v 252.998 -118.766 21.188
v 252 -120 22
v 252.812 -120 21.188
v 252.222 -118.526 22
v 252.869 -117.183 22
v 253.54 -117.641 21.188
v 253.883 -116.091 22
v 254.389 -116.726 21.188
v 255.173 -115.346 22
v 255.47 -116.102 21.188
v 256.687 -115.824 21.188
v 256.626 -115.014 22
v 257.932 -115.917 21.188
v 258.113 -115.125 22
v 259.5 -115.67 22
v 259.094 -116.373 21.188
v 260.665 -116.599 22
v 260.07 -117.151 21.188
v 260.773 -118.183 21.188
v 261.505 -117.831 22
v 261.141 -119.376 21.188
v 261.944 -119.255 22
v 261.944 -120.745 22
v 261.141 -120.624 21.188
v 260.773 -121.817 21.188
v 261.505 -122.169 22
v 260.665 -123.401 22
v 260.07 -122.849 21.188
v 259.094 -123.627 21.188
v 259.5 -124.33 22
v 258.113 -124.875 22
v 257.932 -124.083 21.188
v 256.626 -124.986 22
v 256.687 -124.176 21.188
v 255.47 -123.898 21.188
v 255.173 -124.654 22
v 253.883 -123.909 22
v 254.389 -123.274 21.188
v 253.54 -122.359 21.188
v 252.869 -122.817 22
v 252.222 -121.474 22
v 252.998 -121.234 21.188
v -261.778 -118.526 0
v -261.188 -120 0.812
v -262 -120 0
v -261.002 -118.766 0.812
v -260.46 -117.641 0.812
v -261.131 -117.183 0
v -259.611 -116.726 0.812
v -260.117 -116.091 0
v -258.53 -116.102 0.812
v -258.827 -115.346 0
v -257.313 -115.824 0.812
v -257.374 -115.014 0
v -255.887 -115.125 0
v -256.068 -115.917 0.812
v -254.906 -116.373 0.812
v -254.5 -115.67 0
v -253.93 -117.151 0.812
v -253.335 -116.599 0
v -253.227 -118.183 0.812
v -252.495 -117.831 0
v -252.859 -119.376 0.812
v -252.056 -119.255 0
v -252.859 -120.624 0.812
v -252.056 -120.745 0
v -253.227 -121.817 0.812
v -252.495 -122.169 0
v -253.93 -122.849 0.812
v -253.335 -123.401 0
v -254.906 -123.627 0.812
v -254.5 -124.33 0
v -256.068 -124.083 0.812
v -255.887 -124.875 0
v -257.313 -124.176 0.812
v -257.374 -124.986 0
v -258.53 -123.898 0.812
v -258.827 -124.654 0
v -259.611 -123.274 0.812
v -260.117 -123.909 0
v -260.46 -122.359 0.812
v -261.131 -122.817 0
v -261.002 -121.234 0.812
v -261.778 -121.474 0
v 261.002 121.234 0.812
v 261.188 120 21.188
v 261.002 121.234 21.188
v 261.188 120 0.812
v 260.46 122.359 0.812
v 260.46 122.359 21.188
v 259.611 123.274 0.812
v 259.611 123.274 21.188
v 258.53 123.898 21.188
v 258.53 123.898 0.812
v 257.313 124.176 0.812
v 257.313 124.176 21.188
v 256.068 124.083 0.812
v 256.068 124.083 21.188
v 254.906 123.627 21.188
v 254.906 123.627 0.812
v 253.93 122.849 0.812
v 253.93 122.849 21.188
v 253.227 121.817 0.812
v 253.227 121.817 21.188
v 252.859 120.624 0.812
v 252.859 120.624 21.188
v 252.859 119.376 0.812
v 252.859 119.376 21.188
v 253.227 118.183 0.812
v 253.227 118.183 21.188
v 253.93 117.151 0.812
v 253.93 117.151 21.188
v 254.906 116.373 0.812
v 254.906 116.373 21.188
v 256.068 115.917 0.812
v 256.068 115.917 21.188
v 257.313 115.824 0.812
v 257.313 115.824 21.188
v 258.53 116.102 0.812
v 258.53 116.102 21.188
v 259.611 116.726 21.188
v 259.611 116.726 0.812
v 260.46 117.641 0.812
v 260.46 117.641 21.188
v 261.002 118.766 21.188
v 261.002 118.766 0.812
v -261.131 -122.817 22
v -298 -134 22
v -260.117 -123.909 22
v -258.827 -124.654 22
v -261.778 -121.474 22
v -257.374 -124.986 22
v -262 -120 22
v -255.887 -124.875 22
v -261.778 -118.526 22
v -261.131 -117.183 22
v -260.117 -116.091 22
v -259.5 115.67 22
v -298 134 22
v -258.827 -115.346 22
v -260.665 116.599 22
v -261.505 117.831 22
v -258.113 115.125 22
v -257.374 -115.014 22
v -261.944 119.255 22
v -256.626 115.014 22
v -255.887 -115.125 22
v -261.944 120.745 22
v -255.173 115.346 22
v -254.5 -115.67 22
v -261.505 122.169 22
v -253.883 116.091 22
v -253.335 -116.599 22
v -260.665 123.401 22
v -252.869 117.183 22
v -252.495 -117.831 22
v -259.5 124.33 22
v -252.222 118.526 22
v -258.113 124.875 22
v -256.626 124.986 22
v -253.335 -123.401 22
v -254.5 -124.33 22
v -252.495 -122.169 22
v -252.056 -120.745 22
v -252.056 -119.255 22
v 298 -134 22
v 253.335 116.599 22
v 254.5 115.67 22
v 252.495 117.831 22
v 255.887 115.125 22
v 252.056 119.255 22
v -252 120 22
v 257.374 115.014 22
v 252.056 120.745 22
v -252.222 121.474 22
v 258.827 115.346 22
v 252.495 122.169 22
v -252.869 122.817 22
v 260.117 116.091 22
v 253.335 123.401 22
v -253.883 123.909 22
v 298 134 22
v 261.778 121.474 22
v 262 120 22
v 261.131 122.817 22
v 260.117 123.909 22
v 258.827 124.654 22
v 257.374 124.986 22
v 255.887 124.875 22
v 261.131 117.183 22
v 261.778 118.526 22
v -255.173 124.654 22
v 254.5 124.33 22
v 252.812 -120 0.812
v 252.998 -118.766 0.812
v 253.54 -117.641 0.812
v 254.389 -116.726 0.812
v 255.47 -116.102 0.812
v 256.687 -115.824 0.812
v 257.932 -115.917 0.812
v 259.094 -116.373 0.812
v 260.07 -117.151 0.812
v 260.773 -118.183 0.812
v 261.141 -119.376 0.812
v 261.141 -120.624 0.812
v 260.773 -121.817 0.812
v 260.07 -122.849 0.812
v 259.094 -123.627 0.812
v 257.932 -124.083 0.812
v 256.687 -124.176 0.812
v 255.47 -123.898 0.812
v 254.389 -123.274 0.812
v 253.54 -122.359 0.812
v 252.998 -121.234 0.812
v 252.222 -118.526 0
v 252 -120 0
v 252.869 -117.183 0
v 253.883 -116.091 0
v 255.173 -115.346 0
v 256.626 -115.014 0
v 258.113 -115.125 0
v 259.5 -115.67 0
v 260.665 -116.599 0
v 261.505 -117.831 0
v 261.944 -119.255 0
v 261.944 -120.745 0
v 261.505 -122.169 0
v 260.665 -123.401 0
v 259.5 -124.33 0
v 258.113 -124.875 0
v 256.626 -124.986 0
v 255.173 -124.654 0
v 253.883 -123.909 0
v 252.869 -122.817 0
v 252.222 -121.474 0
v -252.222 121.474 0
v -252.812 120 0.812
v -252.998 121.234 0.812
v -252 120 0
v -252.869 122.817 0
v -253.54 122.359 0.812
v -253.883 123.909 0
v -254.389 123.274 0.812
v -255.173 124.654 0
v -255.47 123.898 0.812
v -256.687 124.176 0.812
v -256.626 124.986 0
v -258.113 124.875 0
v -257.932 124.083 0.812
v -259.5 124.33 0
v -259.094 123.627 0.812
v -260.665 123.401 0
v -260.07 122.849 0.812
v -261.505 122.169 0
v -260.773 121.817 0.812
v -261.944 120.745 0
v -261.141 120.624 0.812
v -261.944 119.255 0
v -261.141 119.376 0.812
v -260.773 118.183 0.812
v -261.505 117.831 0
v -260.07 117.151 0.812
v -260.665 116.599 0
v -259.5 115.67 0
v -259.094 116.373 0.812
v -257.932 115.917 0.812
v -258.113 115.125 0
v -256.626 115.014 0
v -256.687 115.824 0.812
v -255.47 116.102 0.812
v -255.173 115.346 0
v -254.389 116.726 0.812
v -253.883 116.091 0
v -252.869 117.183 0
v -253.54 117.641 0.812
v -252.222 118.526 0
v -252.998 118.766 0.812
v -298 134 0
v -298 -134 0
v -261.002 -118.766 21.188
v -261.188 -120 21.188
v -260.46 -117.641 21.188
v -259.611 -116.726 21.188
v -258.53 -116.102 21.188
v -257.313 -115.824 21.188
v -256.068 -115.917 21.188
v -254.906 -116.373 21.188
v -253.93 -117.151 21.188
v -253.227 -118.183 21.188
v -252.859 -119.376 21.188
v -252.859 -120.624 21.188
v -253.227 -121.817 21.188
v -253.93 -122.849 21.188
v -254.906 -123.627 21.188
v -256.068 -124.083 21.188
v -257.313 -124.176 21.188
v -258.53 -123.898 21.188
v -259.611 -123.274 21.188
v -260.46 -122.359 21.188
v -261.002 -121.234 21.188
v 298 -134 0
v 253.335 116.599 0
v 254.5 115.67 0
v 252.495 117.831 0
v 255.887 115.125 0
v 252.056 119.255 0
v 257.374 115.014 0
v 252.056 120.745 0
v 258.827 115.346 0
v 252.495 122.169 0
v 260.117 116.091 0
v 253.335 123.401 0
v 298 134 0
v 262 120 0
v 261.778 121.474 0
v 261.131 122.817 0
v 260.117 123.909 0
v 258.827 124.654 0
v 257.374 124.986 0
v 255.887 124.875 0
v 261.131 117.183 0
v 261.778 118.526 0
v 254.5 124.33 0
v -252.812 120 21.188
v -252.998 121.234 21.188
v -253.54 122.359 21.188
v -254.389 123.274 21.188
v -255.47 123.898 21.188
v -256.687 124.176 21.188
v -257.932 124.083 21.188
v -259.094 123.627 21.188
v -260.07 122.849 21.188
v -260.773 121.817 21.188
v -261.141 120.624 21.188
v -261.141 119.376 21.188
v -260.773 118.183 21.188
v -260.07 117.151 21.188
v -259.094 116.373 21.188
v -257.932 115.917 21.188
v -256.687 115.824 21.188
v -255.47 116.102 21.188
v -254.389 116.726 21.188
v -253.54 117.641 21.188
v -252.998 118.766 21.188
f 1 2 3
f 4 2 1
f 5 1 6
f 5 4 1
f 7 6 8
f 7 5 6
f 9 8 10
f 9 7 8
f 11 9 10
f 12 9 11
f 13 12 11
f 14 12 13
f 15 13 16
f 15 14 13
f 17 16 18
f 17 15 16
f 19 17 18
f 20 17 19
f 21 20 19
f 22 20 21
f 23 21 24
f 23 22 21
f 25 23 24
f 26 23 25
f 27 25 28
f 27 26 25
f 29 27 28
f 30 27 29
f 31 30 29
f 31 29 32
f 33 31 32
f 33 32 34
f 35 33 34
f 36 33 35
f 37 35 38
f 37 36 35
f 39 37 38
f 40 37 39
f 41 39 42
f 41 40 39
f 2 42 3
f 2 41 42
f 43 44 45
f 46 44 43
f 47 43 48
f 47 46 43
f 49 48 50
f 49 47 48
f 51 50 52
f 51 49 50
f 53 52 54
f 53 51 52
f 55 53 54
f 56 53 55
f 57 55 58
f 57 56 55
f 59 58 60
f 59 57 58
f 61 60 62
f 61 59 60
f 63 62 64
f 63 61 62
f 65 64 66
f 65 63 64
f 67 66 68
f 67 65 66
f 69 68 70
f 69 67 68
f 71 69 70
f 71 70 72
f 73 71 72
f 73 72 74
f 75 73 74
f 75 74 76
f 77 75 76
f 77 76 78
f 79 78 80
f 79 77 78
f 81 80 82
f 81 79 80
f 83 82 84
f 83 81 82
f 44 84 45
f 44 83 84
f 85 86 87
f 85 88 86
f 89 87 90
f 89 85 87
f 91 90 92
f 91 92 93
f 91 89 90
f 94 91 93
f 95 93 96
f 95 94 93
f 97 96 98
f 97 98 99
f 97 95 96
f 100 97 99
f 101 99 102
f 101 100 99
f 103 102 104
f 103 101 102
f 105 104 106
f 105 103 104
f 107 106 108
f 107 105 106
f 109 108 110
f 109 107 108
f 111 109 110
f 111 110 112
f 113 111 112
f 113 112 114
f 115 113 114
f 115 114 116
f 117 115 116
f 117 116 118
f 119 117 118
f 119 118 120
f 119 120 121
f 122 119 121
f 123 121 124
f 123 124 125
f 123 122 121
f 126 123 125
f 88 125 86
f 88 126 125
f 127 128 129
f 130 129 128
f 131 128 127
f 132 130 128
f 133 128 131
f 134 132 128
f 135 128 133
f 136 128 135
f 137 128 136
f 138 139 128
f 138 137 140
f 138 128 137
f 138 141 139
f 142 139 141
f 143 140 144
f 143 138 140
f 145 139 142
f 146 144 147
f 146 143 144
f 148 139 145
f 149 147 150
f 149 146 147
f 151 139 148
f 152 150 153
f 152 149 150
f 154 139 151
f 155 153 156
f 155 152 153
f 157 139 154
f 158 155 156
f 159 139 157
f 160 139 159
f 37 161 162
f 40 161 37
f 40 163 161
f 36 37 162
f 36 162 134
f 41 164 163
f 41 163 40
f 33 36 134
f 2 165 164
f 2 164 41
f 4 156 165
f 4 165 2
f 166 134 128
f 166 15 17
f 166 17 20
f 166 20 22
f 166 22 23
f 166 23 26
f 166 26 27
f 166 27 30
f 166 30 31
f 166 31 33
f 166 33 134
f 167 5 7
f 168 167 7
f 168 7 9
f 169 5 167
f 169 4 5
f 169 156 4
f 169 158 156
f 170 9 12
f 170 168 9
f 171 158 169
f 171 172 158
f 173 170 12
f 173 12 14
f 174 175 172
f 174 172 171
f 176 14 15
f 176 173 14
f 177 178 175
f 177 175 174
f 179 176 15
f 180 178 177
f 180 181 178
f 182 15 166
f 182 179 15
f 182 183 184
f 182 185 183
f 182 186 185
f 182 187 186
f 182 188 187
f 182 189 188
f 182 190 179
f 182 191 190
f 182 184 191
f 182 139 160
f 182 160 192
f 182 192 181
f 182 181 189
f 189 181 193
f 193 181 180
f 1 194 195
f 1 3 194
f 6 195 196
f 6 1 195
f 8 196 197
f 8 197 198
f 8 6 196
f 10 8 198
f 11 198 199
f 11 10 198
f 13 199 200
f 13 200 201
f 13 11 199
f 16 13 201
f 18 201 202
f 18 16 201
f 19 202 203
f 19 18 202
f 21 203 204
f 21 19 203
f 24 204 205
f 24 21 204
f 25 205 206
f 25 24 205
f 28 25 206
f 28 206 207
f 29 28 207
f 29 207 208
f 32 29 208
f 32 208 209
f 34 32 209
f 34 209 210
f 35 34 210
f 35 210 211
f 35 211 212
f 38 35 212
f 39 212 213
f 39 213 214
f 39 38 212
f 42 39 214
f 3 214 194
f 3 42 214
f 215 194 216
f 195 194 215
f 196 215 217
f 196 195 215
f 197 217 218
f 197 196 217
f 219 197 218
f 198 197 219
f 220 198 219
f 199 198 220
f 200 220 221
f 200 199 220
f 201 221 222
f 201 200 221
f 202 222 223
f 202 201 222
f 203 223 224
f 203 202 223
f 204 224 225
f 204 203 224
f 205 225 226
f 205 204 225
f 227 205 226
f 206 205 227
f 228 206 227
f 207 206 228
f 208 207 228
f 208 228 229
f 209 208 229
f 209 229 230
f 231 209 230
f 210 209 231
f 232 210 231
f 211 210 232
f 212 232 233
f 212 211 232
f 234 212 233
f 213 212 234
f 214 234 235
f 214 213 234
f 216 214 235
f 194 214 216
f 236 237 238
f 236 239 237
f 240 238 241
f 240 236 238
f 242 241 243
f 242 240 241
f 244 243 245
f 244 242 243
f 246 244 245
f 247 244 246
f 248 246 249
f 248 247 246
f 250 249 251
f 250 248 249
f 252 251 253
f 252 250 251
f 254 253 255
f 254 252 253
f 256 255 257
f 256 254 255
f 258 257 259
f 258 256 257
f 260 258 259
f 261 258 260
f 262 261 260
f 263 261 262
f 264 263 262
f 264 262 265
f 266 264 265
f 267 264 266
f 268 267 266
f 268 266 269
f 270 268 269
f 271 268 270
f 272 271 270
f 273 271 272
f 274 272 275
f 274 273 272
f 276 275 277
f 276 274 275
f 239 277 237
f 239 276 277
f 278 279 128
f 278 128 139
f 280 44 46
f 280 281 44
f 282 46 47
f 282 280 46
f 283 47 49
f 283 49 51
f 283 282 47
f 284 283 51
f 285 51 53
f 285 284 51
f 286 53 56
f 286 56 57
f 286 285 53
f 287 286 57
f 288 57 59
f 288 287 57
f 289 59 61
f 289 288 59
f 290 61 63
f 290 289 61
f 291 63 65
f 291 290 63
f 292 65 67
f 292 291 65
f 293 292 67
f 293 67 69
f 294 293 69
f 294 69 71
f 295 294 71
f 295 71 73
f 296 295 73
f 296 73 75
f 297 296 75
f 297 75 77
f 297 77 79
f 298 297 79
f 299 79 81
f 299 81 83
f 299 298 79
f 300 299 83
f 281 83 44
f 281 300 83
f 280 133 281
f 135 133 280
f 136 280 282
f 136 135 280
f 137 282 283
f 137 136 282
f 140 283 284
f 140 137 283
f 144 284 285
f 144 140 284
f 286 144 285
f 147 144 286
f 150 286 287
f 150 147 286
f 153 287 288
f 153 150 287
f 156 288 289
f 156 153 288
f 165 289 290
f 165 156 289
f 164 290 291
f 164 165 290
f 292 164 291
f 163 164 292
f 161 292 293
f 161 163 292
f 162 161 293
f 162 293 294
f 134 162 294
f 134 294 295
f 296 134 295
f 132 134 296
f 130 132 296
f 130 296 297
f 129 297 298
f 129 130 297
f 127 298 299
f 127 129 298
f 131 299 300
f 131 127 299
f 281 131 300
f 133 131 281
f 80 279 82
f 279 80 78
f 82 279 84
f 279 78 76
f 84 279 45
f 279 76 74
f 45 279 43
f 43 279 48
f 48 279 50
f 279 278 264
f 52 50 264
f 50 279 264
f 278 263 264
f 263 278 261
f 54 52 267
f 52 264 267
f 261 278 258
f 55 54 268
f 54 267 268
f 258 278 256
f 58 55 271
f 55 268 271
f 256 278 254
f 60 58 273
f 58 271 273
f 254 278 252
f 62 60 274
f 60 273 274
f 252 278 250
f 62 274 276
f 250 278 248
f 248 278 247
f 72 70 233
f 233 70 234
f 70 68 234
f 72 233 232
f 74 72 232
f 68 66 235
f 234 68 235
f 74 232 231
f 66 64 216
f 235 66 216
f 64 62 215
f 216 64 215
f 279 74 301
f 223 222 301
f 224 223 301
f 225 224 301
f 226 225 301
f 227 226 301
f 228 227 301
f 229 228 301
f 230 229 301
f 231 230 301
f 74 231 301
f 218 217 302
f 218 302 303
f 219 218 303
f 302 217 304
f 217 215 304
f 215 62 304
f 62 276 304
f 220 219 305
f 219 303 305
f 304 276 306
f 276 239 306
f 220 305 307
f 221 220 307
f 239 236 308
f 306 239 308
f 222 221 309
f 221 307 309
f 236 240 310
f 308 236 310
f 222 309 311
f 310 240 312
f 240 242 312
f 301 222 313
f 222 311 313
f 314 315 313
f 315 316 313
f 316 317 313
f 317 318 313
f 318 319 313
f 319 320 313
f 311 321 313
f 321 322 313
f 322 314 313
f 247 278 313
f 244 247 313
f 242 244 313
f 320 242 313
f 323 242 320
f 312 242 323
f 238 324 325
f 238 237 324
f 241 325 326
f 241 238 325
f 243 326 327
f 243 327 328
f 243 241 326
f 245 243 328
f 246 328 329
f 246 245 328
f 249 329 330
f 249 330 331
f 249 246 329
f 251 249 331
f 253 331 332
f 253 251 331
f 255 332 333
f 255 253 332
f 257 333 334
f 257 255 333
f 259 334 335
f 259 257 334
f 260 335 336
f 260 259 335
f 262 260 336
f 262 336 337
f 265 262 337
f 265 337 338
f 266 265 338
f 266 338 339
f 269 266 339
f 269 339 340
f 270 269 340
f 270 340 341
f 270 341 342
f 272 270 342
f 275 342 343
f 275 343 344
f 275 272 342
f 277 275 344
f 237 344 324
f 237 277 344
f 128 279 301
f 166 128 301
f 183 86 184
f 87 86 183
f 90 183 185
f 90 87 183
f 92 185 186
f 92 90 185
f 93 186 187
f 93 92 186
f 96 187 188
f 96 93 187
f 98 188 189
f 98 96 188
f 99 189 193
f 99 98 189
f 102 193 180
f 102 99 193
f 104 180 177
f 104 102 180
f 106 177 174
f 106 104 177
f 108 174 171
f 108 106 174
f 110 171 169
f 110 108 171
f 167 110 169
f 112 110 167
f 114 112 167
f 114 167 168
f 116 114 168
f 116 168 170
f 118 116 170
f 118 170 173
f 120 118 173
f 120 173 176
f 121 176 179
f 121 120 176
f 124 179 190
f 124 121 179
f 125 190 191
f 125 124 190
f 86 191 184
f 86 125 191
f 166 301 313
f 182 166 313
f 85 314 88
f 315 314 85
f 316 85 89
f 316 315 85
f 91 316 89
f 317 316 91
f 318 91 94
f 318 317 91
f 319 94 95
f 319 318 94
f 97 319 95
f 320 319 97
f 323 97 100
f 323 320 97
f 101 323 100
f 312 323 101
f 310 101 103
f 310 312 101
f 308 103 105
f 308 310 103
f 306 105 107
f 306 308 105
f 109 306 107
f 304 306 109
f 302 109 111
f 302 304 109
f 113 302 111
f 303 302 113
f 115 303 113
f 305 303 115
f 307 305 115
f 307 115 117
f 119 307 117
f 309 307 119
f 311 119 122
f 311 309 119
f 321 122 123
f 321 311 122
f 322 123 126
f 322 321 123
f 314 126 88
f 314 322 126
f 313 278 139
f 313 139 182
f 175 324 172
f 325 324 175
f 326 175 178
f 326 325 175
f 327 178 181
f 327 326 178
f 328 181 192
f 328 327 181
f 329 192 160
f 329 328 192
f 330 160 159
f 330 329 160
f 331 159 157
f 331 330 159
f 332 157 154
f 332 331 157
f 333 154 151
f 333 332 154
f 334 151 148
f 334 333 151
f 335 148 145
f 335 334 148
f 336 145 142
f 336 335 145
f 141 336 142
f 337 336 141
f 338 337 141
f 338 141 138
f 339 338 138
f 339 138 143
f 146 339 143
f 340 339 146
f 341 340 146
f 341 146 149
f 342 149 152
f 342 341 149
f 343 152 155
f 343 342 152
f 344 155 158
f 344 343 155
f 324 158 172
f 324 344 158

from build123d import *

# Parameters (mm, degrees)
SZKIC1_W                    = 596
SZKIC1_H                    = 268
DODANIE_WYCI_GNI_CIE1_DEPTH = 22


with BuildPart() as part:
    # Szkic1 → Dodanie-wyciągnięcie1 (new body)
    with BuildSketch(Plane.XY):
        Rectangle(SZKIC1_W, SZKIC1_H)
    extrude(amount=DODANIE_WYCI_GNI_CIE1_DEPTH)

    # Szkic2 → Wycięcie-obrót1 (revolve, cut)
    with BuildSketch(Plane(origin=(-257, 0, 0), x_dir=(0, 0, -1), z_dir=(1, 0, 0))):
        Polygon((-22, 120), (-22, 125), (-21.188, 124.188), (-0.812, 124.188), (0, 125), (0, 120), align=None)
    revolve(axis=Axis((-257, 120, 0), (0, 0, 1)), mode=Mode.SUBTRACT)

    # Szkic3 → Wycięcie-obrót2 (revolve, cut)
    with BuildSketch(Plane(origin=(-257, 0, 0), x_dir=(0, 0, -1), z_dir=(1, 0, 0))):
        Polygon((0, -120), (0, -125), (-0.812, -124.188), (-21.188, -124.188), (-22, -125), (-22, -120), align=None)
    revolve(axis=Axis((-257, -120, 22), (0, 0, -1)), mode=Mode.SUBTRACT)

    # Szkic4 → Wycięcie-obrót3 (revolve, cut)
    with BuildSketch(Plane(origin=(257, 0, 0), x_dir=(0, 0, -1), z_dir=(1, 0, 0))):
        Polygon((-22, 120), (-22, 125), (-21.188, 124.188), (-0.812, 124.188), (0, 125), (0, 120), align=None)
    revolve(axis=Axis((257, 120, 0), (0, 0, 1)), mode=Mode.SUBTRACT)

    # Szkic5 → Wycięcie-obrót4 (revolve, cut)
    with BuildSketch(Plane(origin=(257, 0, 0), x_dir=(0, 0, -1), z_dir=(1, 0, 0))):
        Polygon((0, -120), (0, -125), (-0.812, -124.188), (-21.188, -124.188), (-22, -125), (-22, -120), align=None)
    revolve(axis=Axis((257, -120, 22), (0, 0, -1)), mode=Mode.SUBTRACT)


solid = part.part
